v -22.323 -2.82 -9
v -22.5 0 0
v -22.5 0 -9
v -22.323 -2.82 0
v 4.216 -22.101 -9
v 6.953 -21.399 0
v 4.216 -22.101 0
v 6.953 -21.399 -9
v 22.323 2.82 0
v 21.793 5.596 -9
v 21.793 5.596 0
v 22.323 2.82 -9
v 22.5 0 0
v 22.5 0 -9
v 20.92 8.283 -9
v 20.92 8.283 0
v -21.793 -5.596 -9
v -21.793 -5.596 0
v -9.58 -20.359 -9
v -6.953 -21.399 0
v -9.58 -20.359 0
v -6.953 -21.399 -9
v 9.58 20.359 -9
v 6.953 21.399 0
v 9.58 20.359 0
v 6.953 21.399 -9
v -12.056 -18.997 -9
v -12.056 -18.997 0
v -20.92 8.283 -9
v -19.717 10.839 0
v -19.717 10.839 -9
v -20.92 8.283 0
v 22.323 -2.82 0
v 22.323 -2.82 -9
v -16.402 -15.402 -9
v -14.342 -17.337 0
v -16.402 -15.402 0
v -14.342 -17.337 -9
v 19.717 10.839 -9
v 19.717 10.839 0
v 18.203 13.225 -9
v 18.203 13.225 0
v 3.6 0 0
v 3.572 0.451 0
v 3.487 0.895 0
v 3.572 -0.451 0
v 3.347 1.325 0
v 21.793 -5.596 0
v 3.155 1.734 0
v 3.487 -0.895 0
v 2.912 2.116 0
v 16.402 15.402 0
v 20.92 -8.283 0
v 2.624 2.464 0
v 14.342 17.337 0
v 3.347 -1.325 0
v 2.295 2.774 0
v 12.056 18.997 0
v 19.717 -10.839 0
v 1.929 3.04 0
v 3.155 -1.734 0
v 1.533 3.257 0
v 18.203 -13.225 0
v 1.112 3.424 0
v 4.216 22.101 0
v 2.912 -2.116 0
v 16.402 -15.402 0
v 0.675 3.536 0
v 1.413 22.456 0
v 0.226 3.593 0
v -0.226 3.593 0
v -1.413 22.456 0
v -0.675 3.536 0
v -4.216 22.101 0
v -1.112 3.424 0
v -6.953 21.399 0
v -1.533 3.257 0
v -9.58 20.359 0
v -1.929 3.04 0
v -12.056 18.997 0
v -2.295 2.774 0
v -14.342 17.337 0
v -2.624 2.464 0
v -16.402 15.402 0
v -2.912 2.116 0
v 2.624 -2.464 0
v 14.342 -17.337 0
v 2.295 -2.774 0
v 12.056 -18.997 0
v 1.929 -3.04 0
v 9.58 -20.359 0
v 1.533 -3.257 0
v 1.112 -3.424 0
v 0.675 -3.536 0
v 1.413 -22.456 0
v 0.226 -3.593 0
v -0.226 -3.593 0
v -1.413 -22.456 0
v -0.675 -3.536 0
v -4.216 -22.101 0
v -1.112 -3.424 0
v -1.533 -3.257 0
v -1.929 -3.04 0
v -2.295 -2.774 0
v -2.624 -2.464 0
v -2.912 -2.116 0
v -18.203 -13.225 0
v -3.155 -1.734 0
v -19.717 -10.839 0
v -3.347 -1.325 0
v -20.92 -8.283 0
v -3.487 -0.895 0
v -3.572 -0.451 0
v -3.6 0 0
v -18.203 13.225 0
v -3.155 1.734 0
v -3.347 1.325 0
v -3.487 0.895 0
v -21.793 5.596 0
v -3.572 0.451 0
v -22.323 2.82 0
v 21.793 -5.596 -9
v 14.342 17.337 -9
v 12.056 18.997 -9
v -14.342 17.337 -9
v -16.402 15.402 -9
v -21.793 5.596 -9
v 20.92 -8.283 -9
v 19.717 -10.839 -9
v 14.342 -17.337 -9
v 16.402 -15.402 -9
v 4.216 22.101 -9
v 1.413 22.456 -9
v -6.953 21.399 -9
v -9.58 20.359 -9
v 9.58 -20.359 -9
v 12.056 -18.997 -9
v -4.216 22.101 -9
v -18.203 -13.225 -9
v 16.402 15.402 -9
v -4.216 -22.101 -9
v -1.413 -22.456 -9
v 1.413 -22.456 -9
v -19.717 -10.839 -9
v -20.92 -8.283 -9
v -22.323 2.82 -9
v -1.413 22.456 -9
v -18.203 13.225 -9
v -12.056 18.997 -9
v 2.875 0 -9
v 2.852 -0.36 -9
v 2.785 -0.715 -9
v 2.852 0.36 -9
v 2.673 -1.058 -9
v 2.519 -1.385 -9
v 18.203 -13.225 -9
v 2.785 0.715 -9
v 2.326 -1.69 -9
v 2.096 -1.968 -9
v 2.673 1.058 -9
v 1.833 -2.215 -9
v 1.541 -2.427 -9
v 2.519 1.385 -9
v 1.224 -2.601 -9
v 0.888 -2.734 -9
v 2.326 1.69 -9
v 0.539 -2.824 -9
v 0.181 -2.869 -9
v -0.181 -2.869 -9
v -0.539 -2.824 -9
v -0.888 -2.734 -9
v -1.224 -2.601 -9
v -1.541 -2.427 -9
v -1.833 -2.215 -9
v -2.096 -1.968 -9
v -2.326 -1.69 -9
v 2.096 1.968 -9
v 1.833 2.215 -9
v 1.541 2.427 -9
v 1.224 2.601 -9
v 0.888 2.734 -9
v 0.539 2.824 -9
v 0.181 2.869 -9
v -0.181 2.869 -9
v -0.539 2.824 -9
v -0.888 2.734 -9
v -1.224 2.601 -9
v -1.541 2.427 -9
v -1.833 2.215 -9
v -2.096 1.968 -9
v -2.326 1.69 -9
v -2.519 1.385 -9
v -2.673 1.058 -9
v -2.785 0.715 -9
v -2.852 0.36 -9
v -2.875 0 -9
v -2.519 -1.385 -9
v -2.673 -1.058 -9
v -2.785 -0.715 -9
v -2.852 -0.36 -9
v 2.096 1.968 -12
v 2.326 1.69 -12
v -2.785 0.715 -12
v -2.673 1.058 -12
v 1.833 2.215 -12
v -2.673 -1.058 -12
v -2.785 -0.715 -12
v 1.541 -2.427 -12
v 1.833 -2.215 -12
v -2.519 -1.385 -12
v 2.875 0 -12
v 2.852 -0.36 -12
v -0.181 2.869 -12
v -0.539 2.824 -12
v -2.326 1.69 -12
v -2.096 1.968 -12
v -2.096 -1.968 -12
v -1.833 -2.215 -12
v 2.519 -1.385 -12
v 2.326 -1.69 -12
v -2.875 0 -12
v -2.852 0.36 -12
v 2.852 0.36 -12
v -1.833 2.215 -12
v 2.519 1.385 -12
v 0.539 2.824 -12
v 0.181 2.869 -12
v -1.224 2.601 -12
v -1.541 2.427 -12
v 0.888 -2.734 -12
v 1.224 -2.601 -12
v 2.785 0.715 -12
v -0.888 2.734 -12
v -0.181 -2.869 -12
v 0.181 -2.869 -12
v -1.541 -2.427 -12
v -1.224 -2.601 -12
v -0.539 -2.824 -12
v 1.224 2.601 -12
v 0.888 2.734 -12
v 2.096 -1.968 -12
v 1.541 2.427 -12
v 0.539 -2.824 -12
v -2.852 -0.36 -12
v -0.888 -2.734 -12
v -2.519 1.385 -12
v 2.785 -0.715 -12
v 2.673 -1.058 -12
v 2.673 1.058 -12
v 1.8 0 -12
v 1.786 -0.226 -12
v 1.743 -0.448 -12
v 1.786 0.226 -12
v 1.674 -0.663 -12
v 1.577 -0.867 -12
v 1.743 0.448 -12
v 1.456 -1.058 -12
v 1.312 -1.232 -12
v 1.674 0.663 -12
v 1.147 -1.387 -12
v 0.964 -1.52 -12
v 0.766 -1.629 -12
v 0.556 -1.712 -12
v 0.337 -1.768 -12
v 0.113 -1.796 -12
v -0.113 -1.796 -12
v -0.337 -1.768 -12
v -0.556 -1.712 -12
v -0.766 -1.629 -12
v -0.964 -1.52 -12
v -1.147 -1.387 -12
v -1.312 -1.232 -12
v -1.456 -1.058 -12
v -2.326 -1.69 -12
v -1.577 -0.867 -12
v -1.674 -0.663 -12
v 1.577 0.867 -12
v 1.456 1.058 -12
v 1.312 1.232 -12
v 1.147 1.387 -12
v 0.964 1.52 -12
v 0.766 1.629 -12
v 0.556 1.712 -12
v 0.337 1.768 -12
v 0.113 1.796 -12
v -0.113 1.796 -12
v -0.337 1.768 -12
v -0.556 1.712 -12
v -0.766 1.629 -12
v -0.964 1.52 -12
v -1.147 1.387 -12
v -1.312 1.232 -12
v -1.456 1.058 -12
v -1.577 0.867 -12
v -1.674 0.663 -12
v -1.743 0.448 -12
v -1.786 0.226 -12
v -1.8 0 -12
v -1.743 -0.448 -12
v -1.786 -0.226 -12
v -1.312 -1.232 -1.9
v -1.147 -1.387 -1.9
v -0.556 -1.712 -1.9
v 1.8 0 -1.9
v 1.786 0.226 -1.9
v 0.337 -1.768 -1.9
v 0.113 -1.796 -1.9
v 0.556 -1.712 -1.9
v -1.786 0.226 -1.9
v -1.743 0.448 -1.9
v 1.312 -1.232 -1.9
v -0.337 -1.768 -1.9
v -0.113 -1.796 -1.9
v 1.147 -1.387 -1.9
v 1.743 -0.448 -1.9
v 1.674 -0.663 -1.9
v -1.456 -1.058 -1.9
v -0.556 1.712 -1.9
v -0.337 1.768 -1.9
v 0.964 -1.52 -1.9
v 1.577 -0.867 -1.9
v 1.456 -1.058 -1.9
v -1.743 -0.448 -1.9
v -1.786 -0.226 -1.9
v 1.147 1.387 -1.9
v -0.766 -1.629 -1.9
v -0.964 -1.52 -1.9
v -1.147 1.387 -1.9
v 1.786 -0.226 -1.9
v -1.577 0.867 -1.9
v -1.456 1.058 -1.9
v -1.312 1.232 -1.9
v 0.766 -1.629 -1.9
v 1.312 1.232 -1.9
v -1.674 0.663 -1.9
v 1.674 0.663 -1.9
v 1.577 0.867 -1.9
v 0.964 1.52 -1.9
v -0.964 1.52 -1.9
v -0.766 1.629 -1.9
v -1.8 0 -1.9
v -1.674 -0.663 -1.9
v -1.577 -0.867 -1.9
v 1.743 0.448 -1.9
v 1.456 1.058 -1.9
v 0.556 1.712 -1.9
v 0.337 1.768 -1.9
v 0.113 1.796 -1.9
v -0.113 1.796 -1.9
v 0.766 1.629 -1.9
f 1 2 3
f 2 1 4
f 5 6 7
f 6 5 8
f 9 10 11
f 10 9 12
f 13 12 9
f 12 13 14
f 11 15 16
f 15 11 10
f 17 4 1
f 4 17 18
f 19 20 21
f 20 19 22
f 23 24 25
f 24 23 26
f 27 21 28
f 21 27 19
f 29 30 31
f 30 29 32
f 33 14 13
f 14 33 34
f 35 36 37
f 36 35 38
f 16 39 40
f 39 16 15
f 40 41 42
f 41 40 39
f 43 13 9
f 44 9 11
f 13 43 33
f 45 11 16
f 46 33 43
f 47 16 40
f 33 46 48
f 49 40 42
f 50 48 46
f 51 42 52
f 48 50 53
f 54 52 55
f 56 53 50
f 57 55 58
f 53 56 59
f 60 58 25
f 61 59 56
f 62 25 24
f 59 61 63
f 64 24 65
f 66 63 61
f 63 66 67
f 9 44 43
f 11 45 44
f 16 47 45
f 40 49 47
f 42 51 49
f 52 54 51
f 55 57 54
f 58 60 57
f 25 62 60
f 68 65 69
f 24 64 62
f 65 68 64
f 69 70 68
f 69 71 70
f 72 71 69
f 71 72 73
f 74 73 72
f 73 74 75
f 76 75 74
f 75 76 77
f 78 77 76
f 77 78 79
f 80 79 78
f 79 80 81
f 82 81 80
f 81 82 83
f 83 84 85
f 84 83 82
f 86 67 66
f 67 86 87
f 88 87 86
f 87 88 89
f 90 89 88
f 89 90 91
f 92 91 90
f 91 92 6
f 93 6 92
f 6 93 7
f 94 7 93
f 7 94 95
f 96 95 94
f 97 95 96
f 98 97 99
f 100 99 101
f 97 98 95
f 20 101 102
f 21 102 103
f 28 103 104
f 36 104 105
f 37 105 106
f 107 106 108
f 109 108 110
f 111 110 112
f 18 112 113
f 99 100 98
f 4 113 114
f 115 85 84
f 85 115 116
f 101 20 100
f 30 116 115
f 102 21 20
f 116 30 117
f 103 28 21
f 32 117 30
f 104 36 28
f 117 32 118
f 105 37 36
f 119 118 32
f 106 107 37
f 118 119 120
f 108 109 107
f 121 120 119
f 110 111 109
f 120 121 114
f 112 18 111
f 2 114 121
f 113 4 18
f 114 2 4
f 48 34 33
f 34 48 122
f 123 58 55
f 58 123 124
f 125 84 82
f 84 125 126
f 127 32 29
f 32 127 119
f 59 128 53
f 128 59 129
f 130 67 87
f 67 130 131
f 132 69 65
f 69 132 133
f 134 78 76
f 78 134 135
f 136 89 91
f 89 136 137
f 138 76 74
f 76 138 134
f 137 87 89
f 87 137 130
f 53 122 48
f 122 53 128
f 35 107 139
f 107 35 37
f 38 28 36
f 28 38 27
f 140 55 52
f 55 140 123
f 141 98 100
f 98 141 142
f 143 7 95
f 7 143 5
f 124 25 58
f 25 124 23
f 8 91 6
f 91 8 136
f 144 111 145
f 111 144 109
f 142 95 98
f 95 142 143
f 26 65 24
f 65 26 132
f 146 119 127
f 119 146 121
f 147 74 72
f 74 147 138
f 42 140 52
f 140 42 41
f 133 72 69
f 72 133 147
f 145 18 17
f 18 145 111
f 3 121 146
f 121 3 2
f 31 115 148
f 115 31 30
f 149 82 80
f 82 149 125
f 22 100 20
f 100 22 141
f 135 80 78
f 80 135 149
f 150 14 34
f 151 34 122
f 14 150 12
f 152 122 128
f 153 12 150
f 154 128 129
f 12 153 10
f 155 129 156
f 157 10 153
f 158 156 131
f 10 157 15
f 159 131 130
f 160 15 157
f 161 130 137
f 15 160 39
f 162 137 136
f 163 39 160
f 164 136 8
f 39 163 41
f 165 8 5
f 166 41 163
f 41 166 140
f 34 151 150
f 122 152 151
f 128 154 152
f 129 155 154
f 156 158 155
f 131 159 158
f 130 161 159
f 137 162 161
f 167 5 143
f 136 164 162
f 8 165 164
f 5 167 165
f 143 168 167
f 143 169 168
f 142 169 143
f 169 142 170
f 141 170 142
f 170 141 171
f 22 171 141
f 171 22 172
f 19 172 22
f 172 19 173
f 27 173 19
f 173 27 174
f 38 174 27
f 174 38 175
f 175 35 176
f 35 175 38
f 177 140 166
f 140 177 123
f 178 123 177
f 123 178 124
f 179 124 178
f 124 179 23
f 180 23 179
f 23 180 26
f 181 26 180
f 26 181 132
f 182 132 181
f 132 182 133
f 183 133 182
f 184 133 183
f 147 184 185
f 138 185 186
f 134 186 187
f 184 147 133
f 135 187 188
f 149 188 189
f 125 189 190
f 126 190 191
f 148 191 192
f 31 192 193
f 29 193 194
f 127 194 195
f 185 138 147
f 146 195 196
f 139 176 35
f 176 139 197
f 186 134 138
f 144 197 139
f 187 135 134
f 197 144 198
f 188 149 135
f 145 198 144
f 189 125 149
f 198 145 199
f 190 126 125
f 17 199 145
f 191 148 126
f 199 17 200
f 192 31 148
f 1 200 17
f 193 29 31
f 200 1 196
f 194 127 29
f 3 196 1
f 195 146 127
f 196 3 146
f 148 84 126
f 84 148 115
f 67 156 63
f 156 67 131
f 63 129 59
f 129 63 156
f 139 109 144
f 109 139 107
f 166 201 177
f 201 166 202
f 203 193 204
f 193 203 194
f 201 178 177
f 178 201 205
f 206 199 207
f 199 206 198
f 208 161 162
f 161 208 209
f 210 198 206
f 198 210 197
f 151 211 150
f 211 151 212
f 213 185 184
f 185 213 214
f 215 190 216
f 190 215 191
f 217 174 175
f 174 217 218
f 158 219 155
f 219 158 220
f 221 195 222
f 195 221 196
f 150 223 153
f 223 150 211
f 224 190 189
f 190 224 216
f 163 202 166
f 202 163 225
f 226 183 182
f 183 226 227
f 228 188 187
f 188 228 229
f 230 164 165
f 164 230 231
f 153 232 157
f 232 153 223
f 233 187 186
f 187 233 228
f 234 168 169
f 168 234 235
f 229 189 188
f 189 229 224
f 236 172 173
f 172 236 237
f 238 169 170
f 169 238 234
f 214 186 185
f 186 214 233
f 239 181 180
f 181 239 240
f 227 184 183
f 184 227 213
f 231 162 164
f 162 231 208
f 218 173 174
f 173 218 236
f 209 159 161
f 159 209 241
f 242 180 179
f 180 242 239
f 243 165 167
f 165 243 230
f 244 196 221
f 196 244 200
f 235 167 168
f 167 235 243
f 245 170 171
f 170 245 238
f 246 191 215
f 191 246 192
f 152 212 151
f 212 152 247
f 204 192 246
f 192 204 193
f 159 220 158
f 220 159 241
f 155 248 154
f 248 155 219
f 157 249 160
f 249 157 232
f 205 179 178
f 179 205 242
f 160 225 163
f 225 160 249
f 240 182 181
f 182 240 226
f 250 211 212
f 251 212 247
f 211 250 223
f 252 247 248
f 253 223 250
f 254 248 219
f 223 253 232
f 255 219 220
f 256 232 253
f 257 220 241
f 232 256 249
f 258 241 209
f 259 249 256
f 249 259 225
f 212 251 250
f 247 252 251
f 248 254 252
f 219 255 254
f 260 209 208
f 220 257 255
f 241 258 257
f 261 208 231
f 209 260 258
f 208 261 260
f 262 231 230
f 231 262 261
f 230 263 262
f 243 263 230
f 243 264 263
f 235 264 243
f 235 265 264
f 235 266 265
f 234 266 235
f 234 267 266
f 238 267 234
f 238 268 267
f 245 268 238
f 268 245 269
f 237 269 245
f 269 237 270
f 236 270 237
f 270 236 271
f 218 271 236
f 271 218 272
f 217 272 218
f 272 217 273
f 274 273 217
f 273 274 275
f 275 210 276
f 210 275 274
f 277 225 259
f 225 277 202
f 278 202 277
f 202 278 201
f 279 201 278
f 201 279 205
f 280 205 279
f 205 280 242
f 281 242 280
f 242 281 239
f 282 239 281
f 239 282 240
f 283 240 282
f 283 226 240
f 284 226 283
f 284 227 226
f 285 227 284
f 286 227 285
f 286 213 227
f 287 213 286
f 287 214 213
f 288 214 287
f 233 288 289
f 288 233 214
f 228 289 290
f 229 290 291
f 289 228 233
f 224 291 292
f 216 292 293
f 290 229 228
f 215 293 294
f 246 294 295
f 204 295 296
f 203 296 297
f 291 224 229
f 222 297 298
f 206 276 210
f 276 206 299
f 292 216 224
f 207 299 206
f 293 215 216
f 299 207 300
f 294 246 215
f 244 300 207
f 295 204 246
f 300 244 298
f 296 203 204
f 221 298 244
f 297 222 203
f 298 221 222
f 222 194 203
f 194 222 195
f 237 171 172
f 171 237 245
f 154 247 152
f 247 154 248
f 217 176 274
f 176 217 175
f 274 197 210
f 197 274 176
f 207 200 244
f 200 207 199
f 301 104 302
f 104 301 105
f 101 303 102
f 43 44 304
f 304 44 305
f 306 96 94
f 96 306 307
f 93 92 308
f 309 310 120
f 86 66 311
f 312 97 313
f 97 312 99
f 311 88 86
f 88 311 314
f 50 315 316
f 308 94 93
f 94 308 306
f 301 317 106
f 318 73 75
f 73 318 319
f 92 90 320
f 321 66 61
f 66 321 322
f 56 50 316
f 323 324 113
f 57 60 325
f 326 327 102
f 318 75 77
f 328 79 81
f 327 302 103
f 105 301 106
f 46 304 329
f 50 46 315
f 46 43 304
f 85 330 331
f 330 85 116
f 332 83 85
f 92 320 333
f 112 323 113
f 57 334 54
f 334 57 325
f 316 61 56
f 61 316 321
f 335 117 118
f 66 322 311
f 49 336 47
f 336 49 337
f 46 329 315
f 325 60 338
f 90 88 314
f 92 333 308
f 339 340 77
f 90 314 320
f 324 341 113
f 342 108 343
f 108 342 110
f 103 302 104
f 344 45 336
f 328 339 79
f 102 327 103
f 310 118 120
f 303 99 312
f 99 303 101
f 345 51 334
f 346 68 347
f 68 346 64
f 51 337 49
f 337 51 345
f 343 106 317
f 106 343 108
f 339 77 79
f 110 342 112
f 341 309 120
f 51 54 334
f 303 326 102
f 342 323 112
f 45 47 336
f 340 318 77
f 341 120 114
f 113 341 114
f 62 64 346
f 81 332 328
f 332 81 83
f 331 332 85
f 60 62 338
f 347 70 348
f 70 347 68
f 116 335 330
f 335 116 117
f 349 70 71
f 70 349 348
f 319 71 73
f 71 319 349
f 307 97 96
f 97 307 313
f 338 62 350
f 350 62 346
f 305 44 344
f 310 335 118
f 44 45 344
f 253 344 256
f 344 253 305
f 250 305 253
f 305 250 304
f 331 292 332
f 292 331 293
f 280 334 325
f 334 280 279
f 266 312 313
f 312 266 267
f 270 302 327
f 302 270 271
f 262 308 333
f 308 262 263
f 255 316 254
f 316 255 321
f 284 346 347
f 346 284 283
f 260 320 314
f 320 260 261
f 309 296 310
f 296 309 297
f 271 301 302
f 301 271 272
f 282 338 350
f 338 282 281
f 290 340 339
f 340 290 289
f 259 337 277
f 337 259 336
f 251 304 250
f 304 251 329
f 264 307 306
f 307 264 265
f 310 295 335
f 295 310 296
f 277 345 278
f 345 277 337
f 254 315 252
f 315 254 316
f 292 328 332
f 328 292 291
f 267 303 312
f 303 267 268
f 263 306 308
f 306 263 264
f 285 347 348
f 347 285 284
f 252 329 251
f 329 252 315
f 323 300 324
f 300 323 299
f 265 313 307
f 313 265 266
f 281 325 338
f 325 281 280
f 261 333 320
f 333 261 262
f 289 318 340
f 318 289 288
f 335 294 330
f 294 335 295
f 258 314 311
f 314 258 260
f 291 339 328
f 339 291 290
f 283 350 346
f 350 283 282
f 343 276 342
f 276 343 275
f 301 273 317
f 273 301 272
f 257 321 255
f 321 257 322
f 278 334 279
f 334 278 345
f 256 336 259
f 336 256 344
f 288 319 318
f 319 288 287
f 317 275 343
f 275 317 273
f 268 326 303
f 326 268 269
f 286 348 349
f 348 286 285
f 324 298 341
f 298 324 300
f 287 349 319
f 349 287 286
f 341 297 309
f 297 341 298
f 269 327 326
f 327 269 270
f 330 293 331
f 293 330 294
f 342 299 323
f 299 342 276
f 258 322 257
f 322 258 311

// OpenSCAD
$fn = 50;

difference() {
	union() {
		translate(v = [0, 0, -9.0]) {
			cylinder(h = 9, r = 22.5);
		}
		#translate(v = [0, 0, -12.0]) {
			cylinder(h = 12, r = 2.875);
		}
	}
	union() {
		translate(v = [0, 0, 0]) {
			rotate(a = [0, 0, 0]) {
				difference() {
					union() {
						translate(v = [0, 0, -12.0]) {
							cylinder(h = 12, r = 1.5);
						}
						translate(v = [0, 0, -1.9]) {
							cylinder(h = 1.9, r1 = 1.8, r2 = 3.6);
						}
						translate(v = [0, 0, -12.0]) {
							cylinder(h = 12, r = 1.8);
						}
						translate(v = [0, 0, -12.0]) {
							cylinder(h = 12, r = 1.5);
						}
					}
					union();
				}
			}
		}
	}
}
